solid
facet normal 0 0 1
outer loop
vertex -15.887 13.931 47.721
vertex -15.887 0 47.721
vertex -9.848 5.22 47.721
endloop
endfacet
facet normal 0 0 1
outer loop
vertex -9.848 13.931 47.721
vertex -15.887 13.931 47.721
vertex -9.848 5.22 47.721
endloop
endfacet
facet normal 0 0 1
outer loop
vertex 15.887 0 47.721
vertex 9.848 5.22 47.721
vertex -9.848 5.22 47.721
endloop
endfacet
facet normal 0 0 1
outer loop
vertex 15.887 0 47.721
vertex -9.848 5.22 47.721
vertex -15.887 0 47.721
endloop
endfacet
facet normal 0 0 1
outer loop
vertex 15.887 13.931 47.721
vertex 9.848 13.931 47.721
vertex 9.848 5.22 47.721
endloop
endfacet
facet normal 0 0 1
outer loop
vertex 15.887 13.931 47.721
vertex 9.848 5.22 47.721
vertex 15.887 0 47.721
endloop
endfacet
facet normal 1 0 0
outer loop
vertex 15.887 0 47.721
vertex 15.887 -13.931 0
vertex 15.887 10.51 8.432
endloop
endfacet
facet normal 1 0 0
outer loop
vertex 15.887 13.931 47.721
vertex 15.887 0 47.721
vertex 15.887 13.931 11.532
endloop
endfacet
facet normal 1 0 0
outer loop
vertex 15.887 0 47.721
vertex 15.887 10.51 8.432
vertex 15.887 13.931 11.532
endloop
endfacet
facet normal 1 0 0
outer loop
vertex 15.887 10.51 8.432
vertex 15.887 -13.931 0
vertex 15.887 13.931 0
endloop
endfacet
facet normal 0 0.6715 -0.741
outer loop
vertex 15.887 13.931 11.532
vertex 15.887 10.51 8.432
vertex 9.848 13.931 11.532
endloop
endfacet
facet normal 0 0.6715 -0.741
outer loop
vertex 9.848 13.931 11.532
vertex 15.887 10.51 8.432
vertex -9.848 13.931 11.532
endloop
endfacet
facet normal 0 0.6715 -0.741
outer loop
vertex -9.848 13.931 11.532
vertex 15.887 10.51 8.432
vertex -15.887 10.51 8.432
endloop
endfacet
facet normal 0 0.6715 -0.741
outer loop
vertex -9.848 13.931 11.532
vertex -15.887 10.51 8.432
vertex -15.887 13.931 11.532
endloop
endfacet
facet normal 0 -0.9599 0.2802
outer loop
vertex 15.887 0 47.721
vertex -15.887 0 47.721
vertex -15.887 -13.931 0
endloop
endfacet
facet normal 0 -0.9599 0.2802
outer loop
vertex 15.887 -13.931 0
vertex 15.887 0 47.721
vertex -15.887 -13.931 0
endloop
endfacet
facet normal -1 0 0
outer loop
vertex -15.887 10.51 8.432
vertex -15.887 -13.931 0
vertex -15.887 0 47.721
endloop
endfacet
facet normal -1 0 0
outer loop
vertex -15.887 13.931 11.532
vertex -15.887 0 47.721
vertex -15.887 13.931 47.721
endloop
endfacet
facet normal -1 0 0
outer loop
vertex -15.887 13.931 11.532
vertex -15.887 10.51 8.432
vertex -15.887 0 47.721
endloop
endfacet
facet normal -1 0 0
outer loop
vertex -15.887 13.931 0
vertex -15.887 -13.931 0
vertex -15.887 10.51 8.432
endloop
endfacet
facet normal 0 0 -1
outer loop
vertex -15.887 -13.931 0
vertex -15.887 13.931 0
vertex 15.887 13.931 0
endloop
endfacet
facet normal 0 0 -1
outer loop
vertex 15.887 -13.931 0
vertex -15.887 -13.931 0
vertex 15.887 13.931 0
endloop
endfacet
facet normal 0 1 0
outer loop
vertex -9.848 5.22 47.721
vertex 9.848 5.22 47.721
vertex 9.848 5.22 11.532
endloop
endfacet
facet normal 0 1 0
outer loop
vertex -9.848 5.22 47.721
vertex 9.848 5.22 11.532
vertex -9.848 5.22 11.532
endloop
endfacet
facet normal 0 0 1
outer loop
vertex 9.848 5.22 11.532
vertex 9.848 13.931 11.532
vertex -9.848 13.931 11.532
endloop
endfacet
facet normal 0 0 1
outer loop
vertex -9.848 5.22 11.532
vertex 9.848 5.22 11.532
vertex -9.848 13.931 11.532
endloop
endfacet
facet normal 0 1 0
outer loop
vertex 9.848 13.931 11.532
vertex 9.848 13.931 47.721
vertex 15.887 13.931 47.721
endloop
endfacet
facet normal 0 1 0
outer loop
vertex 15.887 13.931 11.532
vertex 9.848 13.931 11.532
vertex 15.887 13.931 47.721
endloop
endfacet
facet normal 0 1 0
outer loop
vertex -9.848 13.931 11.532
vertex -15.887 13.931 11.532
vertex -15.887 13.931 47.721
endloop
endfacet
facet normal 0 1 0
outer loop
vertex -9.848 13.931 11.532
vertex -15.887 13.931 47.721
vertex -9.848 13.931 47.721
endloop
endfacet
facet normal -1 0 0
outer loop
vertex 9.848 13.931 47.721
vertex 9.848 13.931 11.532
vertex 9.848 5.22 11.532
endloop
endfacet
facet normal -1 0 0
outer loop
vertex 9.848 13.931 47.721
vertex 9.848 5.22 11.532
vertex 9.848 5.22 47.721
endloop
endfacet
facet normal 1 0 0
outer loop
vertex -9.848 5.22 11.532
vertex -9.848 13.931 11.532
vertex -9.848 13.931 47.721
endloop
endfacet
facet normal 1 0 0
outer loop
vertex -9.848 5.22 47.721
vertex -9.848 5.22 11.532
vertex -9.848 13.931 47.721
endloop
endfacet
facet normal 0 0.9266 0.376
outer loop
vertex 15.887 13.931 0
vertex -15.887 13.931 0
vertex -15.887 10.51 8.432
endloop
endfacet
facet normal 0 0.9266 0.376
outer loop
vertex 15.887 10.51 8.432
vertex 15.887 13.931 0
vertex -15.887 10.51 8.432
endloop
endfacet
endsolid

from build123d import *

# Parameters (mm, degrees)
F0_W     = 31.773508
F0_H     = 27.862936
F1_DEPTH = 47.720866
F3_DEPTH = 35.224047
F4_W     = 19.695132
F4_H     = 37.246185
F5_DEPTH = 8.711955


with BuildPart() as f1:
    # F0 (on Top) → F1 (new body)
    with BuildSketch(Plane.XY):
        Rectangle(F0_W, F0_H)
    extrude(amount=F1_DEPTH)

    # F2 (on face) → F3 (cut)
    with BuildSketch(Plane(origin=(-15.886754, 0, 0), x_dir=(0, -1, 0), z_dir=(-1, 0, 0))):
        Polygon((13.931468, 47.720866), (0, 47.720866), (13.931468, 0), align=None)
        Polygon((-13.931468, 11.532108), (-13.931468, 0), (-10.5097, 8.432195), align=None)
    extrude(amount=-F3_DEPTH, mode=Mode.SUBTRACT)

    # F4 (on face) → F5 (cut)
    with BuildSketch(Plane(origin=(0, 13.931468, 0), x_dir=(-1, 0, 0), z_dir=(0, 1, 0))):
        with Locations((0, 30.1552)):
            Rectangle(F4_W, F4_H)
    extrude(amount=-F5_DEPTH, mode=Mode.SUBTRACT)


solid = f1.part
